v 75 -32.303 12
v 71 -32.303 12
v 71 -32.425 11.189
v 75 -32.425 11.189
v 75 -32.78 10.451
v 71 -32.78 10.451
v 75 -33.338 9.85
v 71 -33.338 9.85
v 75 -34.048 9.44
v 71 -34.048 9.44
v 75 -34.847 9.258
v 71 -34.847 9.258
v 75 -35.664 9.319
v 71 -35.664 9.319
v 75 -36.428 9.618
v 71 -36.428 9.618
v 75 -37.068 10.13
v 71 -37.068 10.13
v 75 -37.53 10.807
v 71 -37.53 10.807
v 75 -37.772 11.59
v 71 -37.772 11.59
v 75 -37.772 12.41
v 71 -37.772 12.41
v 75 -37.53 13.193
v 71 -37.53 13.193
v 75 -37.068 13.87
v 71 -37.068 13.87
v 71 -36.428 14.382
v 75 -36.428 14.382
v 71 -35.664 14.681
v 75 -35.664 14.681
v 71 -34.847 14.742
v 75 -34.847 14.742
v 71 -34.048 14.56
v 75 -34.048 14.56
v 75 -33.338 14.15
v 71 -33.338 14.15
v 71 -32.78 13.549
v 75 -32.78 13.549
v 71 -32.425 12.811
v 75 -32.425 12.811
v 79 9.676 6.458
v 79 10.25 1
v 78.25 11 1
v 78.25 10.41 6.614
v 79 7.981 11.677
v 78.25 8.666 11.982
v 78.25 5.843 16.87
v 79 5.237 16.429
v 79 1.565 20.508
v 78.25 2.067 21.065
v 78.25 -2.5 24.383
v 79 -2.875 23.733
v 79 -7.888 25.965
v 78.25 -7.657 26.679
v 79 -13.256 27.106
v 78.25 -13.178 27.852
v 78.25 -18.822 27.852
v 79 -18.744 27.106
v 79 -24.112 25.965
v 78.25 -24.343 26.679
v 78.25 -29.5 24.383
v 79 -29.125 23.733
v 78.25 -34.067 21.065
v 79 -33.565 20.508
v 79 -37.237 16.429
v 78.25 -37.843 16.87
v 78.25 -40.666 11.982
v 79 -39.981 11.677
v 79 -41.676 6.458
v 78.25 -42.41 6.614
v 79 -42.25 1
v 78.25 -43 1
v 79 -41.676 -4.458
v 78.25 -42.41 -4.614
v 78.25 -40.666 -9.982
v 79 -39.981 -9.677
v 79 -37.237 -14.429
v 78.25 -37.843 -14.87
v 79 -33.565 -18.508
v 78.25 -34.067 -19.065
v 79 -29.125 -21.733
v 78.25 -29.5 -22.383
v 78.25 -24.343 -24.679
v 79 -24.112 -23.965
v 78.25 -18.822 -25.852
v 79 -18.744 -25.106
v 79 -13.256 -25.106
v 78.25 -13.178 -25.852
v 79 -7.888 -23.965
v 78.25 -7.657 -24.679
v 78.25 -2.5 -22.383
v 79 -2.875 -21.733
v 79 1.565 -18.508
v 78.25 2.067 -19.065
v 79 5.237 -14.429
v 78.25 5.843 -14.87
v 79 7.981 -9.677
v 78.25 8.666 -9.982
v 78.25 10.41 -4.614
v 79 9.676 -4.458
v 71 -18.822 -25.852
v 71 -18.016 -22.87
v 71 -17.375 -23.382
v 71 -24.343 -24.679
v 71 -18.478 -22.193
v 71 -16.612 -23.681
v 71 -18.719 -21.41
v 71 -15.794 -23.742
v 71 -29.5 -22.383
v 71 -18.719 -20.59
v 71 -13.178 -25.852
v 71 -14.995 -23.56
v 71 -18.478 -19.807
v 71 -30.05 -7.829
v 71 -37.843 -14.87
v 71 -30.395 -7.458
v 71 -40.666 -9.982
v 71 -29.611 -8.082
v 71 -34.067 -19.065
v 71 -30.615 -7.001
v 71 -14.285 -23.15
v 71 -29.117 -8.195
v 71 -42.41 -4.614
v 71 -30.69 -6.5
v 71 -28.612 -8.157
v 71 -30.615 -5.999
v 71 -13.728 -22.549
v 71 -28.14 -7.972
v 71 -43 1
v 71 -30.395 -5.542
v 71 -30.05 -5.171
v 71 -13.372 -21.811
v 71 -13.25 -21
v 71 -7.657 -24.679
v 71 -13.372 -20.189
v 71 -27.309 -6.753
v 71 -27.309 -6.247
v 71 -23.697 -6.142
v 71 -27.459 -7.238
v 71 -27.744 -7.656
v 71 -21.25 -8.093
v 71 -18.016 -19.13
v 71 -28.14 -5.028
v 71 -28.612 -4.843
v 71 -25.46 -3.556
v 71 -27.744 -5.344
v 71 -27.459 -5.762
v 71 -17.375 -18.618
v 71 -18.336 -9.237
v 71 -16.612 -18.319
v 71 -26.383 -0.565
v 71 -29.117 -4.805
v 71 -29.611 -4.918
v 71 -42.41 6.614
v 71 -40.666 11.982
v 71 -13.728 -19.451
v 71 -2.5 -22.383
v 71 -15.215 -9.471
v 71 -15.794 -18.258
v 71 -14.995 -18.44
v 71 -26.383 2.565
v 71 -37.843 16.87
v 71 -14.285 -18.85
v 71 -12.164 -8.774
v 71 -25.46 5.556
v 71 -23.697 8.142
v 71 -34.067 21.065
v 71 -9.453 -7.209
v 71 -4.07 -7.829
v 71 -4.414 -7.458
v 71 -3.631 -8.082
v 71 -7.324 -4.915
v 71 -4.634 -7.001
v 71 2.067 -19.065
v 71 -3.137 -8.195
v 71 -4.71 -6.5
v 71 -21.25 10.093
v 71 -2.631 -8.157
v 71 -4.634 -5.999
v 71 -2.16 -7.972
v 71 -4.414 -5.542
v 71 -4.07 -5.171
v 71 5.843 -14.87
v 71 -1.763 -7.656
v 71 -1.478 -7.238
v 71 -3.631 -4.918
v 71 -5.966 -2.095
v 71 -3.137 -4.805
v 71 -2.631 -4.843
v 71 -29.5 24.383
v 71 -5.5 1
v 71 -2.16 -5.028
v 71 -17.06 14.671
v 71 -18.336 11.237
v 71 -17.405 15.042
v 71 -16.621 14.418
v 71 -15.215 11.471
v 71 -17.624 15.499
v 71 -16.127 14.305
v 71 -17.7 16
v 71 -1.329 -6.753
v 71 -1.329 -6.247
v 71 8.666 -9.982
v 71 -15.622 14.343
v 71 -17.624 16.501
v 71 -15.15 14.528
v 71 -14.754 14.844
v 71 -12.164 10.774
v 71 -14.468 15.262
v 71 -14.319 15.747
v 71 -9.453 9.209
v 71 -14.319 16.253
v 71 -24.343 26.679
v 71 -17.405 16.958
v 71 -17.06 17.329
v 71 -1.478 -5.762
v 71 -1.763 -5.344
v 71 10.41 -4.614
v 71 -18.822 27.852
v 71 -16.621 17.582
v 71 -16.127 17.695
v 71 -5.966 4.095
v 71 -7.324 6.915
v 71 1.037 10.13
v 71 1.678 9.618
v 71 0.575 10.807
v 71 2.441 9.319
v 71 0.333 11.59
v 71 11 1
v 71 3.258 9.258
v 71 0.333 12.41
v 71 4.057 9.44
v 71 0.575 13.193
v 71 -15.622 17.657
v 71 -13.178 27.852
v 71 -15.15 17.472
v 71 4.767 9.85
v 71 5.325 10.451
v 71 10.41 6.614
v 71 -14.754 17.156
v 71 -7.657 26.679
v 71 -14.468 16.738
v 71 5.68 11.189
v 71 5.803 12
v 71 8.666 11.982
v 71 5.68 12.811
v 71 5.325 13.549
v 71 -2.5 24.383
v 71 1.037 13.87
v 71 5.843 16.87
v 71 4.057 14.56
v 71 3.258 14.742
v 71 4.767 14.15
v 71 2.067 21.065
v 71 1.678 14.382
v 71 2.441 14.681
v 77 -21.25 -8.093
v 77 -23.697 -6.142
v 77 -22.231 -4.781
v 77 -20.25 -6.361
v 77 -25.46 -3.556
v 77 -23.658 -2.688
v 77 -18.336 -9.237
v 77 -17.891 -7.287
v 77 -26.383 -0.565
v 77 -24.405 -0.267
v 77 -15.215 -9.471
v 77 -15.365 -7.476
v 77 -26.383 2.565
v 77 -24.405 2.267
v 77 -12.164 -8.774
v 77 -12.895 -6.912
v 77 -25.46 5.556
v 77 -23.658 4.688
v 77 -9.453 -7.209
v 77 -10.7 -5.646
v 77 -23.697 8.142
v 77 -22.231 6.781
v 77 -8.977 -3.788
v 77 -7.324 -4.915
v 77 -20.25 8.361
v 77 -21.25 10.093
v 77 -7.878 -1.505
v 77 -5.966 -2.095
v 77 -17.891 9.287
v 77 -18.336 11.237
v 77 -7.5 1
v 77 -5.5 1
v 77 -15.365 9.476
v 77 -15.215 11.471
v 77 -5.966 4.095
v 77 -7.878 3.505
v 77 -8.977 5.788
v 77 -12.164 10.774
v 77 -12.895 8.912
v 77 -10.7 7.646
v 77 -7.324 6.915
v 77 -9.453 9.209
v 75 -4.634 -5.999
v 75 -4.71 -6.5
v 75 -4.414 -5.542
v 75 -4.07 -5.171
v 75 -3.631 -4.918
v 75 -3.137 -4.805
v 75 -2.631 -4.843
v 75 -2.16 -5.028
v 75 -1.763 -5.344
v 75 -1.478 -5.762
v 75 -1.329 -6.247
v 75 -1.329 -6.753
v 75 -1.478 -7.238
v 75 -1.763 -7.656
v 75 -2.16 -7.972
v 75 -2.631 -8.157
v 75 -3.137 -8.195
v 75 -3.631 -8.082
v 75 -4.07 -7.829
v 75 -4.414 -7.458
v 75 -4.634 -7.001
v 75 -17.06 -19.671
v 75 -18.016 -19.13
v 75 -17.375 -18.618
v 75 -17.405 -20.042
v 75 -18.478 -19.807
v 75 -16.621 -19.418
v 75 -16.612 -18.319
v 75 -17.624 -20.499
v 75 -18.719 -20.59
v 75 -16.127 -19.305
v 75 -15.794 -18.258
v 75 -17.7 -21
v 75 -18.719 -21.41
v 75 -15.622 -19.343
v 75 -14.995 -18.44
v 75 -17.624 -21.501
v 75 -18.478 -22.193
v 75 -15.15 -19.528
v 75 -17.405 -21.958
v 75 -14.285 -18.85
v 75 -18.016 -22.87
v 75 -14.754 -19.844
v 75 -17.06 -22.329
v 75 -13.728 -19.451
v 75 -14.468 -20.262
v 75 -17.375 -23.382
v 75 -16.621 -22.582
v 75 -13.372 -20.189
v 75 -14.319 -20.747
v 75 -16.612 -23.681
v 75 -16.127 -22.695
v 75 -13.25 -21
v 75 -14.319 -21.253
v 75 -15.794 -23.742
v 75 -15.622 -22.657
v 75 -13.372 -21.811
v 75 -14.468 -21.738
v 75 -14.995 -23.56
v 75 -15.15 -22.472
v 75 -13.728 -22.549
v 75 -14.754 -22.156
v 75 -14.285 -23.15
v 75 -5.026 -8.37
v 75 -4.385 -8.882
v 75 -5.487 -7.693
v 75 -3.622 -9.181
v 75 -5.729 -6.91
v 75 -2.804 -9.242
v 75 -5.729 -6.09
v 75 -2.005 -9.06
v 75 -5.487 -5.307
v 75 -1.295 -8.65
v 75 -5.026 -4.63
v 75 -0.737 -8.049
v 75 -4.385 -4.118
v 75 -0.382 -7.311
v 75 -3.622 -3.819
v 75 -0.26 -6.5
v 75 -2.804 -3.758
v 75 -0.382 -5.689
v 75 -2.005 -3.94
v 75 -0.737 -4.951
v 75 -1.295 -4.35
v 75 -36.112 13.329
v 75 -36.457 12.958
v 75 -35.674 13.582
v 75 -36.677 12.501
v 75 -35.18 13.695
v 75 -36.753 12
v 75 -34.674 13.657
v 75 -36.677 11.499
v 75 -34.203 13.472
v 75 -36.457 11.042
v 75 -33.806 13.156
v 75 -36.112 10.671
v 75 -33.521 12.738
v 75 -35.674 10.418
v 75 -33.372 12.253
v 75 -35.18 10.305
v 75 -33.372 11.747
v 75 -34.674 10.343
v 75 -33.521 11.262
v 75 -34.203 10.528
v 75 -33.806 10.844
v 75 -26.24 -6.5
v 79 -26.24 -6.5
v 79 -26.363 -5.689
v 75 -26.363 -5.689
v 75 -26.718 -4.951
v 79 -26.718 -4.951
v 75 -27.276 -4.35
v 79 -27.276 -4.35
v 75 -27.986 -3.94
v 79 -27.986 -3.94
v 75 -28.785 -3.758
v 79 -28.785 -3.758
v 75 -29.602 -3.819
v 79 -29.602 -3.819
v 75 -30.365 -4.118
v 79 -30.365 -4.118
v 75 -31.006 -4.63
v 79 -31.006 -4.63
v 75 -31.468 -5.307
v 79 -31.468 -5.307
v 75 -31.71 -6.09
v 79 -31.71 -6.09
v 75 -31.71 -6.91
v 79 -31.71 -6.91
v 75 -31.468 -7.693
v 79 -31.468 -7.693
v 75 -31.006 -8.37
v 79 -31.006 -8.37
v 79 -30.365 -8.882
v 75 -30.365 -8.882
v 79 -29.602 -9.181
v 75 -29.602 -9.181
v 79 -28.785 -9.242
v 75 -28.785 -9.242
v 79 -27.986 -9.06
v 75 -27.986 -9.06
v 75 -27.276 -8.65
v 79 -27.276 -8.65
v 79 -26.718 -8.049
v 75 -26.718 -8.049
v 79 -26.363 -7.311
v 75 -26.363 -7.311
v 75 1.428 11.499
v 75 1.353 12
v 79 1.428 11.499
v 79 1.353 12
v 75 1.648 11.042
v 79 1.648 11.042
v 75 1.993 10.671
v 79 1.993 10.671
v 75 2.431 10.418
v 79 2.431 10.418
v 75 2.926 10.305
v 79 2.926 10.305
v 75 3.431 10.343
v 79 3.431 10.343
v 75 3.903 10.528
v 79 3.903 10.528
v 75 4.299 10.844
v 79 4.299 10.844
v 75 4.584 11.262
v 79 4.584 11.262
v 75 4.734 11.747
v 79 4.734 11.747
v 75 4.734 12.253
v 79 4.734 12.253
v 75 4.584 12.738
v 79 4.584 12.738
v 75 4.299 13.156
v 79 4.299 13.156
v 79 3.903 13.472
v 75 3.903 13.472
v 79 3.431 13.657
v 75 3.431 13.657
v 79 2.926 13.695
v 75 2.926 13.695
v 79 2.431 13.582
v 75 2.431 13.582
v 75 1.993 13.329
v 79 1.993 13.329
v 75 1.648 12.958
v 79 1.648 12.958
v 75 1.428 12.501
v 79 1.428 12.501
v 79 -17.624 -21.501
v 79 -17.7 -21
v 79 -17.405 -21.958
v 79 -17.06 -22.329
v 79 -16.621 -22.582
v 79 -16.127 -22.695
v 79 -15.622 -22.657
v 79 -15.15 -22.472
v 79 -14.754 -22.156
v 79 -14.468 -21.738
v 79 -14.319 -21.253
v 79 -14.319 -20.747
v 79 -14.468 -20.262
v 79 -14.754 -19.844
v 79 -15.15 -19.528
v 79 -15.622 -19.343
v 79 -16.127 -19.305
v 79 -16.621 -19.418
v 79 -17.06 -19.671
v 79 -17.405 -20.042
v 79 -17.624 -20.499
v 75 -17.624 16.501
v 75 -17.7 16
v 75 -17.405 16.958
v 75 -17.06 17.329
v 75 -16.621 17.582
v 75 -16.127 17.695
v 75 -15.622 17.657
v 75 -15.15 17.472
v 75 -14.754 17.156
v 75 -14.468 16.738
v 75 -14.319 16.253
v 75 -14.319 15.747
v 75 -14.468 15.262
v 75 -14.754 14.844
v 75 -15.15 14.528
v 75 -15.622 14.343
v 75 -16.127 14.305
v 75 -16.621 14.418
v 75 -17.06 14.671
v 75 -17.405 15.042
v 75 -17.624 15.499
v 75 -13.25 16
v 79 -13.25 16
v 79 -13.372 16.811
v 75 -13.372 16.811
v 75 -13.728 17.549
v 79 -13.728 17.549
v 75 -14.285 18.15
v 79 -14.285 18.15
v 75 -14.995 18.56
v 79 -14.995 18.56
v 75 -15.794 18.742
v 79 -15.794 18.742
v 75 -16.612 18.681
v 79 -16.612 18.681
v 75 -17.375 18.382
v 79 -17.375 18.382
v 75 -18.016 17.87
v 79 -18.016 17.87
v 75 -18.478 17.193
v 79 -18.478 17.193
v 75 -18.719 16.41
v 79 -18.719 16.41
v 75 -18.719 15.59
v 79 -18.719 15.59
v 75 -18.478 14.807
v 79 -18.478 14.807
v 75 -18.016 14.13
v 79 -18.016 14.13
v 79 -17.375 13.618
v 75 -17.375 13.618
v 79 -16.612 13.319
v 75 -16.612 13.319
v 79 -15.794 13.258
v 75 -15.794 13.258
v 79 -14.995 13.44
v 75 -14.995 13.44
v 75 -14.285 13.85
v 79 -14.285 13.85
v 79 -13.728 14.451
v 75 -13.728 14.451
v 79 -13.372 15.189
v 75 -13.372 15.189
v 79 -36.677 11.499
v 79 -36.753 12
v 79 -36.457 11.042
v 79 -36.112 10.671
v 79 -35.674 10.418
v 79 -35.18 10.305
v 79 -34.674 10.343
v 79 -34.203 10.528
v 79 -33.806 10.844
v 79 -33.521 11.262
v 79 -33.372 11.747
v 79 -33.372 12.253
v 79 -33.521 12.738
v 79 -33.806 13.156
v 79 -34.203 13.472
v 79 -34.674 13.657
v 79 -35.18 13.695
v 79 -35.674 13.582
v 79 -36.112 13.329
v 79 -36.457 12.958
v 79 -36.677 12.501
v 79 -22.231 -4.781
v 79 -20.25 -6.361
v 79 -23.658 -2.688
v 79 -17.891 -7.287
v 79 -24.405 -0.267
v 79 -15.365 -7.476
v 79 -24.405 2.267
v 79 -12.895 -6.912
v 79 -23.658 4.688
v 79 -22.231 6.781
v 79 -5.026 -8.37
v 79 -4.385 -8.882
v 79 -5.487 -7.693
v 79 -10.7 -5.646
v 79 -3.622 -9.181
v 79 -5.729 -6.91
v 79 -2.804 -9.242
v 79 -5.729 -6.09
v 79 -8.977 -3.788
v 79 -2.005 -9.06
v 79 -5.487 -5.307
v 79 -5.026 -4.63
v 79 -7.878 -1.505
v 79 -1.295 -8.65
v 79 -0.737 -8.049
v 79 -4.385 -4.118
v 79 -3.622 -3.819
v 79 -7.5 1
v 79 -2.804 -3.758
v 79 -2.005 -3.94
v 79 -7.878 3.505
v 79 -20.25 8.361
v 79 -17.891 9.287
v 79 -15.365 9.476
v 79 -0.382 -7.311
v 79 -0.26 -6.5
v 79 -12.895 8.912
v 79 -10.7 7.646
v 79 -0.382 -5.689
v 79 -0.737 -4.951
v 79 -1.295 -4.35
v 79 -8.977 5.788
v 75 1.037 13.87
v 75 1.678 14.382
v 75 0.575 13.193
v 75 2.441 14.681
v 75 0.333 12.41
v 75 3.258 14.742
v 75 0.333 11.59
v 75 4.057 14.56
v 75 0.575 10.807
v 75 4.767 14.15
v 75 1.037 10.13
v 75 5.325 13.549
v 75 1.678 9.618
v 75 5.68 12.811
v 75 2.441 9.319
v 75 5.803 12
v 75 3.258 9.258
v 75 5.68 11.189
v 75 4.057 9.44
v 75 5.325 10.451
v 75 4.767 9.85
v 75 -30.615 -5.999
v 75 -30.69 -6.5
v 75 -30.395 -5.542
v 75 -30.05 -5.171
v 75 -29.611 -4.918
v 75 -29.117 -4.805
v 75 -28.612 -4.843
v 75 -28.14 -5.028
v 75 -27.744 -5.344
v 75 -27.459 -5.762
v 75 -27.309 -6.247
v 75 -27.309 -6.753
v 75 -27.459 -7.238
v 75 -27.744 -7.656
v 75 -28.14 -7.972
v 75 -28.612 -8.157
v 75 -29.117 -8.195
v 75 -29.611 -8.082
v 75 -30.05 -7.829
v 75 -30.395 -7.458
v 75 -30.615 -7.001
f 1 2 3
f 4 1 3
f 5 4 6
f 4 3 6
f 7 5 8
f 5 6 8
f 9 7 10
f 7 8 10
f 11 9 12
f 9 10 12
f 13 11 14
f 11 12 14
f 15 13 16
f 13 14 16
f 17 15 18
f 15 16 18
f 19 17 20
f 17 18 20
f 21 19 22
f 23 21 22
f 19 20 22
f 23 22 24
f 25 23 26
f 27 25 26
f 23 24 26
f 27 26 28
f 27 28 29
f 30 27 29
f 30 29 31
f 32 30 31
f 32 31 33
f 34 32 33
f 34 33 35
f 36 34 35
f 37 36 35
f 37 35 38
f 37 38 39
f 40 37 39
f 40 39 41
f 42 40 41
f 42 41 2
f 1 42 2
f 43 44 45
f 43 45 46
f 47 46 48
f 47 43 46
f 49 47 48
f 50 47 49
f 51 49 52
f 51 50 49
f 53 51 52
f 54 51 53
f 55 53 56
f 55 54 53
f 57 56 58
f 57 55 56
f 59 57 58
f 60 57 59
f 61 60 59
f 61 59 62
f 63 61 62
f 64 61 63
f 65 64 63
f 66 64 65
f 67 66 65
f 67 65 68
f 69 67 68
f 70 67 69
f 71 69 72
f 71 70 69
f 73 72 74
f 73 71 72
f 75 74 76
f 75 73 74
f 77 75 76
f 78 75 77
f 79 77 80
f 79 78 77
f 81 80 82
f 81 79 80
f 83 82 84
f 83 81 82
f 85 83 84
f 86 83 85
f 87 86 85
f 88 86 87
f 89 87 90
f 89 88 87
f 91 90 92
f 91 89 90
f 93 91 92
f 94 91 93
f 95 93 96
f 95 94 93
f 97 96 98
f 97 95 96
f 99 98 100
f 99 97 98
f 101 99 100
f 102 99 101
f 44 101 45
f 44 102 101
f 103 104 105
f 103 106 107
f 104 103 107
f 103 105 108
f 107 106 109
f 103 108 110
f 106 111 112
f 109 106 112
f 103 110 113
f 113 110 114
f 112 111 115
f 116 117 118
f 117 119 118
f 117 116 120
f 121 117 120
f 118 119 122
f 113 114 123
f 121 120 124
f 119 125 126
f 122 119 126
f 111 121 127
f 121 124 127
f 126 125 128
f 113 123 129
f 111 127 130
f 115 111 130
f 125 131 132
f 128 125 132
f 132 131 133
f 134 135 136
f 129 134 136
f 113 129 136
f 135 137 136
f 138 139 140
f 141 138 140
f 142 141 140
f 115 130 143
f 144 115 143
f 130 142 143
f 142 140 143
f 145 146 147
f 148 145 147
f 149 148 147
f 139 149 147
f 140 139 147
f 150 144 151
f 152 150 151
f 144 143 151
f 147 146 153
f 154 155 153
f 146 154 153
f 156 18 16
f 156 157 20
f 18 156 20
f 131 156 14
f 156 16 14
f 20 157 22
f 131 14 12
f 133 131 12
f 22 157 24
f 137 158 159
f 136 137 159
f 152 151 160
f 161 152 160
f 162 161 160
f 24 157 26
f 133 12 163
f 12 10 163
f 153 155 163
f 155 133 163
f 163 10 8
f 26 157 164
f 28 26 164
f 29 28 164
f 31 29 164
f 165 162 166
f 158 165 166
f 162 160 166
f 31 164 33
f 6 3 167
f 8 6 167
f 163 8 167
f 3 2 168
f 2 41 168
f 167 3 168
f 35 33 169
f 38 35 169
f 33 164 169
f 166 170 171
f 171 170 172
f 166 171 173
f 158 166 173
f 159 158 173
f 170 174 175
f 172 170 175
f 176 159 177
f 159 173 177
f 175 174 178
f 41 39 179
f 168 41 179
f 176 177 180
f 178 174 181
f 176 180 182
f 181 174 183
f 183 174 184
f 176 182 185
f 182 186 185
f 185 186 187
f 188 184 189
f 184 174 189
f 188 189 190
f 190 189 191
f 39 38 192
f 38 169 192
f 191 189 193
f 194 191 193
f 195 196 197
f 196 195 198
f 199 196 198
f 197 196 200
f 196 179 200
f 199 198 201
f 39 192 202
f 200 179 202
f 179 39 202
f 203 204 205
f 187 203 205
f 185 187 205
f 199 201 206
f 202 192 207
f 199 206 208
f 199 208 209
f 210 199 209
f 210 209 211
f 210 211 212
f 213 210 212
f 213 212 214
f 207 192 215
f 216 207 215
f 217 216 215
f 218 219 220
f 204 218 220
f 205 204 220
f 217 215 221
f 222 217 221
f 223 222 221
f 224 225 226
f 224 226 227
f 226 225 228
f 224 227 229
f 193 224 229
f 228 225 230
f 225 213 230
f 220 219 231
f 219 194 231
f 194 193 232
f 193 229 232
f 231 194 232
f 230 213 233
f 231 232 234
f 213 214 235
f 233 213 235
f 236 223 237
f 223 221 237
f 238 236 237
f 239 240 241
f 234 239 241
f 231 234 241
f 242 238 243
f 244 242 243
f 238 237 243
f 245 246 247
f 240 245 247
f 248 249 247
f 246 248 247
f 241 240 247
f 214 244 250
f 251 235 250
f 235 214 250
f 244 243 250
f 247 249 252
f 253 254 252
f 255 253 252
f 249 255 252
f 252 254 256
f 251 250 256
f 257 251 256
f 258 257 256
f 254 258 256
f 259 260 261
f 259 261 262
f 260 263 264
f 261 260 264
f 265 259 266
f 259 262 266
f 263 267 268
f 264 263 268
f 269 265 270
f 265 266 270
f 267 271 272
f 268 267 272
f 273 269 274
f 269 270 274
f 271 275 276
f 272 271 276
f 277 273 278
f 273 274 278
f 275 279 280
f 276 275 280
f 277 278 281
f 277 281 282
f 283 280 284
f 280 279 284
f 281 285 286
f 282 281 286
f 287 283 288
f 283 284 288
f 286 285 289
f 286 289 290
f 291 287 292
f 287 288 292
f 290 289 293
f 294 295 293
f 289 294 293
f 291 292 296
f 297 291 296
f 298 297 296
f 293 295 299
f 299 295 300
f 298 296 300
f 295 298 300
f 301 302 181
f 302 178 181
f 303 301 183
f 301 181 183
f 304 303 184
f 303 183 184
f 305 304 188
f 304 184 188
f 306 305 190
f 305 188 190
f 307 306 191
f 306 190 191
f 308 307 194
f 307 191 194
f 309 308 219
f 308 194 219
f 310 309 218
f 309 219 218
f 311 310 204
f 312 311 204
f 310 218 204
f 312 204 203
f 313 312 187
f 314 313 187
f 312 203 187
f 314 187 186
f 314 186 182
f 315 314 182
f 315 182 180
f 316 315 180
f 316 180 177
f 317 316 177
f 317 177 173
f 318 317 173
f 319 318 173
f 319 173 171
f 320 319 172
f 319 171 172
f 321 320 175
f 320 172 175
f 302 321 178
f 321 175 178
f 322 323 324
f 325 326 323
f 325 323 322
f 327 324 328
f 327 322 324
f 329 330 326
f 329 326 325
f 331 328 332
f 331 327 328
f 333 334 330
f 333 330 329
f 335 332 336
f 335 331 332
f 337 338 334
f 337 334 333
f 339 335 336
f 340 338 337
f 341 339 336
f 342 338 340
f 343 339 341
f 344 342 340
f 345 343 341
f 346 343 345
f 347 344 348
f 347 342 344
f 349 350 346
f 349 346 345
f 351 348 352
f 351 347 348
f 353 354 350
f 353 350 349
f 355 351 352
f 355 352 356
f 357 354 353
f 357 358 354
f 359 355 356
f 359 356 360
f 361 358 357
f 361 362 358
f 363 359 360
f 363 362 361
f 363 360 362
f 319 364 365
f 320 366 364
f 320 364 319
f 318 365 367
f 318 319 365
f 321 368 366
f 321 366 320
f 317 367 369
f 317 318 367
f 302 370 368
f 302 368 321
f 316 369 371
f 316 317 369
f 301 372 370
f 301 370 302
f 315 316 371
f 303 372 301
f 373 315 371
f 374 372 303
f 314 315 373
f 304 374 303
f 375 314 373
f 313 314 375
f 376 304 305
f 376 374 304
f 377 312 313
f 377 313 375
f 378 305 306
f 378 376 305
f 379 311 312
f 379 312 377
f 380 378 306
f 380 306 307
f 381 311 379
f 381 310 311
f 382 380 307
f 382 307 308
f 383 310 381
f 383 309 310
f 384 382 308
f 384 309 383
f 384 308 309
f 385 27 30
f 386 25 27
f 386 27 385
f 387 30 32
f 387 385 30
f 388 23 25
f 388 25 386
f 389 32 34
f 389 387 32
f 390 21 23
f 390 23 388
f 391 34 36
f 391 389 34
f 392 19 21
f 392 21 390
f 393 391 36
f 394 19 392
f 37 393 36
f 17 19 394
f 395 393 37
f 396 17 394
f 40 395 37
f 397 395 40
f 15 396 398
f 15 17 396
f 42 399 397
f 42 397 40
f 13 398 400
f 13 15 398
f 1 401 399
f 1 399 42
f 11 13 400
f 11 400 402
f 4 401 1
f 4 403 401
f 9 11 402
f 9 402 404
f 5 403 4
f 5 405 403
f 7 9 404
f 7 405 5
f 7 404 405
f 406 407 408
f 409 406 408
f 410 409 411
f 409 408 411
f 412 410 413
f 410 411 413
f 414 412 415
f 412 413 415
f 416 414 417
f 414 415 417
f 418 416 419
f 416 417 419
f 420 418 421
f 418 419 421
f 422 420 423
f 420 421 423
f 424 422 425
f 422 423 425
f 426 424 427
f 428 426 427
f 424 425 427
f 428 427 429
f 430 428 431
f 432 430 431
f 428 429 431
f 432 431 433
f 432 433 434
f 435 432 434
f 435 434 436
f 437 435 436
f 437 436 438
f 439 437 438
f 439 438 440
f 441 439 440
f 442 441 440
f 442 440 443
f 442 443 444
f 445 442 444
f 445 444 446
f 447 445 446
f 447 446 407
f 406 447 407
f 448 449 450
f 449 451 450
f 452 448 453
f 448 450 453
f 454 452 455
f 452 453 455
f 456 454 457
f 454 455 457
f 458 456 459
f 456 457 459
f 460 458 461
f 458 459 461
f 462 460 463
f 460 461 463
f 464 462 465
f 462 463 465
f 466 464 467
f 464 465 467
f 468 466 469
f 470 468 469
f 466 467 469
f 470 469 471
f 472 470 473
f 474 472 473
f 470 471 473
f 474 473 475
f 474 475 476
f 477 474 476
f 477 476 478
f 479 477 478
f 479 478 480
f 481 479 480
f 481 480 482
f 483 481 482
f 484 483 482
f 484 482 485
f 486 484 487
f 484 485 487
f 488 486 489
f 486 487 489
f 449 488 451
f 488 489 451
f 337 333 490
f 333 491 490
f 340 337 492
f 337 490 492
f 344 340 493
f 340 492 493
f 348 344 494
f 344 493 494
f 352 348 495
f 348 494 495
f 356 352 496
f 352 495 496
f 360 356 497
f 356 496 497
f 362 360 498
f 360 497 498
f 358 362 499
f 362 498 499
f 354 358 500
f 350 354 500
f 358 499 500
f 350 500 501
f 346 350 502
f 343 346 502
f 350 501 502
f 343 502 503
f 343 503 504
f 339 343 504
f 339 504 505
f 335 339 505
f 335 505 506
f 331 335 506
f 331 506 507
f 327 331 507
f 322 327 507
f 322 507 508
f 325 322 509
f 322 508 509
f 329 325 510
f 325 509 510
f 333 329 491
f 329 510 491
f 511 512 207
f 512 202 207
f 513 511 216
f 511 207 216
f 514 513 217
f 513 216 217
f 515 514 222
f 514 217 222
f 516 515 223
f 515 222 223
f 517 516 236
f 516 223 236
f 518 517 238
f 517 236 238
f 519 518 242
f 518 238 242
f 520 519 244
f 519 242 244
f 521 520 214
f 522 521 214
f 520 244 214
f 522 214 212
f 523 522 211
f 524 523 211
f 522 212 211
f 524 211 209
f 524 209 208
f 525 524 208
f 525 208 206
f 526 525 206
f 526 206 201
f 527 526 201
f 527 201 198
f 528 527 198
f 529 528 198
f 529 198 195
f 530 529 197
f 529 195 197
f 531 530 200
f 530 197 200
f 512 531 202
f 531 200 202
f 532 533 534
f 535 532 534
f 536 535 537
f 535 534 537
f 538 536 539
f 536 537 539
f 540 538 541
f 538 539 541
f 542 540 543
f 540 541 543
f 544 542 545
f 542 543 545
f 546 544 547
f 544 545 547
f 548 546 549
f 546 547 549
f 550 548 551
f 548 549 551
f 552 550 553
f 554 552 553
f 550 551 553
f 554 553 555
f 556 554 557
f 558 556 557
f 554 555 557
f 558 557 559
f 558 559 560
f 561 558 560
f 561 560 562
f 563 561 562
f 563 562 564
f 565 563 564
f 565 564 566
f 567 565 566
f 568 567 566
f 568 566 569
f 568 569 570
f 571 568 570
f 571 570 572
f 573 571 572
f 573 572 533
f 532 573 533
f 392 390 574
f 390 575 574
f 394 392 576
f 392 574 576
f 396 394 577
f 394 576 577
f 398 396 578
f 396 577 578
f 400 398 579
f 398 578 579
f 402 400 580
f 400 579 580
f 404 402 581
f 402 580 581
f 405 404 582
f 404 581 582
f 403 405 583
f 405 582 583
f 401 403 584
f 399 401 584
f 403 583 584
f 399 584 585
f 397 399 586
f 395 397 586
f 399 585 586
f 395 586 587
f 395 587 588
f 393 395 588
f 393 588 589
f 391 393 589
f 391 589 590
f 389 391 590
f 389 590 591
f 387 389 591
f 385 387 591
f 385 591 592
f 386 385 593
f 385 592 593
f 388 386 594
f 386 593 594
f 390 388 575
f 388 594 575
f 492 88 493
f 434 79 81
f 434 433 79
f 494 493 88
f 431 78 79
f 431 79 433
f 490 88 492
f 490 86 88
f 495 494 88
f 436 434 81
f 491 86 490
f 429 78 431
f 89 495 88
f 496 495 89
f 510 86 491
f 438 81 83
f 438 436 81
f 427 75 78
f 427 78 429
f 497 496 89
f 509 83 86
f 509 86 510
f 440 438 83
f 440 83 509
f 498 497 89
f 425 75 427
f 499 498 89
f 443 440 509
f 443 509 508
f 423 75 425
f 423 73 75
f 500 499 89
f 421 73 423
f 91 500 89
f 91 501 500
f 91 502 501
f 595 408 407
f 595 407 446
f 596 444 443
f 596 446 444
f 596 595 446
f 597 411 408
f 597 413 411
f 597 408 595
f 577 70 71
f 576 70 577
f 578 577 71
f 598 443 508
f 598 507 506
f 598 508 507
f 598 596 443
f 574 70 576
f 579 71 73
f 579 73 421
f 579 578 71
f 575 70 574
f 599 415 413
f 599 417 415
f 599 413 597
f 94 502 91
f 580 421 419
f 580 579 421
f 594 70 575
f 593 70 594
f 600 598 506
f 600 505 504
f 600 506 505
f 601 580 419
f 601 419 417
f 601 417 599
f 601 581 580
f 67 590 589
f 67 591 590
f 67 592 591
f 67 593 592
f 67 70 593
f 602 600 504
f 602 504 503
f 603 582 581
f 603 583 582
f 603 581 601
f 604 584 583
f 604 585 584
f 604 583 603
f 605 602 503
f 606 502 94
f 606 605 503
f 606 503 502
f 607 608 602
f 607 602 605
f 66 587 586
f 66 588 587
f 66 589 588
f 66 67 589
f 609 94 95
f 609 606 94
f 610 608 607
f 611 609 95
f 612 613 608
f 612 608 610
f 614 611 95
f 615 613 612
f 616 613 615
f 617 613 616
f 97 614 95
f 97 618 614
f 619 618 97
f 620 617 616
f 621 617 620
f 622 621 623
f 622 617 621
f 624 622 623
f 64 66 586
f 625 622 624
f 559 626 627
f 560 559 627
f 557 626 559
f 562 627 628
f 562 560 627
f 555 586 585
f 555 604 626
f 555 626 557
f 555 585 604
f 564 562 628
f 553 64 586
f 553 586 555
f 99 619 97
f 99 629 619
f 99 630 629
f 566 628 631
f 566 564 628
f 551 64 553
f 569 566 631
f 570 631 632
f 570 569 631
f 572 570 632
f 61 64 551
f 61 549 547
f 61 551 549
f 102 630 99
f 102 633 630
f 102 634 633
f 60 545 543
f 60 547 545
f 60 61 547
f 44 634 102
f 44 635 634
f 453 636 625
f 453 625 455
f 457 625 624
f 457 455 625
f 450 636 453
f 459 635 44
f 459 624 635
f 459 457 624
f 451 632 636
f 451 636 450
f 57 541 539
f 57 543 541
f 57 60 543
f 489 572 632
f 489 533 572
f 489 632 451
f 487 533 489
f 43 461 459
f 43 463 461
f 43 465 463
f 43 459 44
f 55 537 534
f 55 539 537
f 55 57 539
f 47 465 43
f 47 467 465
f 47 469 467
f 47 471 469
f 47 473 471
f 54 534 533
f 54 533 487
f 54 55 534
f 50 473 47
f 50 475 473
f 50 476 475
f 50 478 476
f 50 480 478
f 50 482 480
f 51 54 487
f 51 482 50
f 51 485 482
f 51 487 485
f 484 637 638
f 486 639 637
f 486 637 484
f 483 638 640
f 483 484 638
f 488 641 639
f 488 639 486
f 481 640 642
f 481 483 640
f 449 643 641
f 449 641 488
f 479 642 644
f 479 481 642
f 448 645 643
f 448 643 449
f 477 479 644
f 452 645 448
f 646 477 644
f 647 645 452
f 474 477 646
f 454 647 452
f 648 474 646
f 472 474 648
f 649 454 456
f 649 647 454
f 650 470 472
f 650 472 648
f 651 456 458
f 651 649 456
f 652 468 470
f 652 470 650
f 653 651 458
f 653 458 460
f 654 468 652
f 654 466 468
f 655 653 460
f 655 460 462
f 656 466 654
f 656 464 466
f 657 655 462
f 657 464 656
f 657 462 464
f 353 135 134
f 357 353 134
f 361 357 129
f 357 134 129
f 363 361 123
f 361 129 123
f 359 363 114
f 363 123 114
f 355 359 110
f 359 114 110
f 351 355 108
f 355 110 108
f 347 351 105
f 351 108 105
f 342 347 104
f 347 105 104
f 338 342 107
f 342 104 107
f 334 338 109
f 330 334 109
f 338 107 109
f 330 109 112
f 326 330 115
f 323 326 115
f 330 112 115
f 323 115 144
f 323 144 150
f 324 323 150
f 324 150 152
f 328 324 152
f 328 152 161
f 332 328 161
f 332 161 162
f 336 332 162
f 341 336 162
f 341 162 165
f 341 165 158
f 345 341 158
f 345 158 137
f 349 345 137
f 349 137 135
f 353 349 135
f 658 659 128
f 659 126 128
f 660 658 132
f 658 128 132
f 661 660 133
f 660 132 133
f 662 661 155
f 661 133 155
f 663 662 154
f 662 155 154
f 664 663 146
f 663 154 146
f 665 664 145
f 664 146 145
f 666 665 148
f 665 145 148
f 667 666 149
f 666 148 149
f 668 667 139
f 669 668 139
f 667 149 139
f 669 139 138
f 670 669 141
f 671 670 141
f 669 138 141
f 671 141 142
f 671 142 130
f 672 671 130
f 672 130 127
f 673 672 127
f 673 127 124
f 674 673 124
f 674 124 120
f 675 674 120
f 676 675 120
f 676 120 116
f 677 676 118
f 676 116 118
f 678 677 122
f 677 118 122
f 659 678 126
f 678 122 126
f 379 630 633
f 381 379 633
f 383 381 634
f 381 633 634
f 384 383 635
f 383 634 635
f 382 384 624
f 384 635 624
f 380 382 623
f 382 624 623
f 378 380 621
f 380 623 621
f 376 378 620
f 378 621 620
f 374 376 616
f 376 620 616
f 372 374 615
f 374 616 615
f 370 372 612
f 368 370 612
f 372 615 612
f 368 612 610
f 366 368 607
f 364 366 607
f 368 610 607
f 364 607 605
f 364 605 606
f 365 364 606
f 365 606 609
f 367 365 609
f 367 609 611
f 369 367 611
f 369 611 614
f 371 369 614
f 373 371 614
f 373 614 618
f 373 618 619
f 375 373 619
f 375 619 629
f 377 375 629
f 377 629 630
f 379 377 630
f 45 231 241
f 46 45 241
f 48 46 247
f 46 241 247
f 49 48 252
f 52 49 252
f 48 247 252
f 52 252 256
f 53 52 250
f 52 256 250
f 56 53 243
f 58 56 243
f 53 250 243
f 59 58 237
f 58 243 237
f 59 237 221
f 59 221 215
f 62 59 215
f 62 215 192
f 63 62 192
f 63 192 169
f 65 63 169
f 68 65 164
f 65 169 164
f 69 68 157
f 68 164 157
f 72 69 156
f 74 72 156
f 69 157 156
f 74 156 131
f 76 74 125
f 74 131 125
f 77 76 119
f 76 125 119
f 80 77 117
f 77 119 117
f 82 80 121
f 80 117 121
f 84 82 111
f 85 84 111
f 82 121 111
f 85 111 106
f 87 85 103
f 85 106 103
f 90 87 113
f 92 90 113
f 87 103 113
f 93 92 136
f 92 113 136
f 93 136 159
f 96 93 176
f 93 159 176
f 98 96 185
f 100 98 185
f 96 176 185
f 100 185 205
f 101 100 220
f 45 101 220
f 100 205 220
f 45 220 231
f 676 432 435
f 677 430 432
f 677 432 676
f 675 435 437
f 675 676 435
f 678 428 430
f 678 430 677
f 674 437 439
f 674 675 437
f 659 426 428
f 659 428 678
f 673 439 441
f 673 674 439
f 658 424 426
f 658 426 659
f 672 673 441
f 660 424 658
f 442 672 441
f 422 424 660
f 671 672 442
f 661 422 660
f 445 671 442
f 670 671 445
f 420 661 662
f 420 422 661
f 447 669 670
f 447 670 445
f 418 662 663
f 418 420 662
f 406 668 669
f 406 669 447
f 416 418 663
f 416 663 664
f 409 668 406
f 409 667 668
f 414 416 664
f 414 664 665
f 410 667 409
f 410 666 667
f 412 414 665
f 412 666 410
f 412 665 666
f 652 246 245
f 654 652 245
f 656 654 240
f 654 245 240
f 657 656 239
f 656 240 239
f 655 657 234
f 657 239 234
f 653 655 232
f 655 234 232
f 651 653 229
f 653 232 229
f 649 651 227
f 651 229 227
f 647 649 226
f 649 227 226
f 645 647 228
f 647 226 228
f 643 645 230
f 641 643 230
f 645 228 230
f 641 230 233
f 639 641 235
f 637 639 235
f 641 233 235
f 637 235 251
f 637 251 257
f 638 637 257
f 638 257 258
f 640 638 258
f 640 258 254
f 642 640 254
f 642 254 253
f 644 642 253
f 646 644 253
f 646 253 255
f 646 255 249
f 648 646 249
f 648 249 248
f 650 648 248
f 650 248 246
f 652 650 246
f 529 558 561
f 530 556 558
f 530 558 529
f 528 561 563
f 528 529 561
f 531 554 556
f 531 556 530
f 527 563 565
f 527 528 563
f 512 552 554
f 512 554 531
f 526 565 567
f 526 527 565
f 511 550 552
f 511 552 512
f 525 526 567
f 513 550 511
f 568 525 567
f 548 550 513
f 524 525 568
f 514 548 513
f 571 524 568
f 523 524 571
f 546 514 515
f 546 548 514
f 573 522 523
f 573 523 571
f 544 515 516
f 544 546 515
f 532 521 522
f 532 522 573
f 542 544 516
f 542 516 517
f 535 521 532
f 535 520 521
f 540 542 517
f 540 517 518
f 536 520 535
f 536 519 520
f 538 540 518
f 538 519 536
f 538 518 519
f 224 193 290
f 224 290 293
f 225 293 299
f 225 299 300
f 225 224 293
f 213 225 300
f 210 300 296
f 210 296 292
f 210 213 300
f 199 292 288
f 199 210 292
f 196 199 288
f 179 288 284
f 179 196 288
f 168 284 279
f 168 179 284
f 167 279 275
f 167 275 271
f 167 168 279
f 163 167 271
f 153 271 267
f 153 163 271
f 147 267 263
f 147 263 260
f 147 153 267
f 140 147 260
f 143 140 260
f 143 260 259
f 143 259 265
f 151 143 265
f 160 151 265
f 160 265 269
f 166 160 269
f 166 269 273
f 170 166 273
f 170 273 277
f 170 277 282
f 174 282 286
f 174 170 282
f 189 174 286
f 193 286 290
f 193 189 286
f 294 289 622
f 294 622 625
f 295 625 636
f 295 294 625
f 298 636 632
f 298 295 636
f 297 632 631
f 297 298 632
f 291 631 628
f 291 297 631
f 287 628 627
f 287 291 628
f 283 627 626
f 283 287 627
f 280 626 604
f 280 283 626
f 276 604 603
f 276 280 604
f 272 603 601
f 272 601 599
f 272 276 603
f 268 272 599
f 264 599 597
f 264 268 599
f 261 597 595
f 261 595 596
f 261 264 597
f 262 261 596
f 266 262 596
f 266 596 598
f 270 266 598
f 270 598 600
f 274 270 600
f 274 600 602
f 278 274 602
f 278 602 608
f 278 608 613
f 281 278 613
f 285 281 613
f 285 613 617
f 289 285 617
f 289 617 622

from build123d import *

# Parameters (mm, degrees)
SKETCH046_R         = 27
SKETCH046_R_2       = 8.5
SKETCH046_R_3       = 1.65
PAD029_DEPTH        = 8
SKETCH048_R         = 10.5
POCKET014_DEPTH     = 6
HOLE_D              = 3.4
HOLE_CBORE_D        = 5.5
HOLE_CBORE_DEPTH    = 4
HOLE001_D           = 3.4
HOLE001_CBORE_D     = 5.5
HOLE001_CBORE_DEPTH = 4
CHAMFER_SIZE        = 0.75


with BuildPart() as part:
    # Sketch046 → Pad029 (new body)
    with BuildSketch(Plane.YZ.offset(69)):
        with Locations((-10, -6)):
            Circle(SKETCH046_R)
        with Locations((-10, -6)):
            Circle(SKETCH046_R_2, mode=Mode.SUBTRACT)
        with Locations((-10, 9)):
            Circle(SKETCH046_R_3, mode=Mode.SUBTRACT)
        with Locations((2.990381, -13.5)):
            Circle(SKETCH046_R_3, mode=Mode.SUBTRACT)
        with Locations((-22.990381, -13.5)):
            Circle(SKETCH046_R_3, mode=Mode.SUBTRACT)
    extrude(amount=PAD029_DEPTH)

    # Sketch048 → Pocket014 (cut)
    with BuildSketch(Plane.YZ.offset(69)):
        with Locations((-10, -6)):
            Circle(SKETCH048_R)
    extrude(amount=POCKET014_DEPTH, mode=Mode.SUBTRACT)

    # Hole (through all)
    with Locations(Plane(origin=(69, 0, 0), x_dir=(0, 1, 0), z_dir=(-1, 0, 0))):
        with Locations((-29.052559, -5), (9.052559, -5), (-10, 28)):
            CounterBoreHole(HOLE_D / 2, HOLE_CBORE_D / 2, HOLE_CBORE_DEPTH)

    # Hole001 (through all)
    with Locations(Plane.YZ.offset(77)):
        with Locations((-22.990381, -13.5), (-10, 9), (2.990381, -13.5)):
            CounterBoreHole(HOLE001_D / 2, HOLE001_CBORE_D / 2, HOLE001_CBORE_DEPTH)

    # Chamfer
    chamfer_edges = [part.edges().sort_by_distance(p)[0] for p in [
        (77, -37, -6),
    ]]
    chamfer(chamfer_edges, length=CHAMFER_SIZE)


with BuildPart() as part_1:
    # Body011 placement: moved
    add(part.part.moved(Location((2, -6, 7))))


solid = part_1.part
